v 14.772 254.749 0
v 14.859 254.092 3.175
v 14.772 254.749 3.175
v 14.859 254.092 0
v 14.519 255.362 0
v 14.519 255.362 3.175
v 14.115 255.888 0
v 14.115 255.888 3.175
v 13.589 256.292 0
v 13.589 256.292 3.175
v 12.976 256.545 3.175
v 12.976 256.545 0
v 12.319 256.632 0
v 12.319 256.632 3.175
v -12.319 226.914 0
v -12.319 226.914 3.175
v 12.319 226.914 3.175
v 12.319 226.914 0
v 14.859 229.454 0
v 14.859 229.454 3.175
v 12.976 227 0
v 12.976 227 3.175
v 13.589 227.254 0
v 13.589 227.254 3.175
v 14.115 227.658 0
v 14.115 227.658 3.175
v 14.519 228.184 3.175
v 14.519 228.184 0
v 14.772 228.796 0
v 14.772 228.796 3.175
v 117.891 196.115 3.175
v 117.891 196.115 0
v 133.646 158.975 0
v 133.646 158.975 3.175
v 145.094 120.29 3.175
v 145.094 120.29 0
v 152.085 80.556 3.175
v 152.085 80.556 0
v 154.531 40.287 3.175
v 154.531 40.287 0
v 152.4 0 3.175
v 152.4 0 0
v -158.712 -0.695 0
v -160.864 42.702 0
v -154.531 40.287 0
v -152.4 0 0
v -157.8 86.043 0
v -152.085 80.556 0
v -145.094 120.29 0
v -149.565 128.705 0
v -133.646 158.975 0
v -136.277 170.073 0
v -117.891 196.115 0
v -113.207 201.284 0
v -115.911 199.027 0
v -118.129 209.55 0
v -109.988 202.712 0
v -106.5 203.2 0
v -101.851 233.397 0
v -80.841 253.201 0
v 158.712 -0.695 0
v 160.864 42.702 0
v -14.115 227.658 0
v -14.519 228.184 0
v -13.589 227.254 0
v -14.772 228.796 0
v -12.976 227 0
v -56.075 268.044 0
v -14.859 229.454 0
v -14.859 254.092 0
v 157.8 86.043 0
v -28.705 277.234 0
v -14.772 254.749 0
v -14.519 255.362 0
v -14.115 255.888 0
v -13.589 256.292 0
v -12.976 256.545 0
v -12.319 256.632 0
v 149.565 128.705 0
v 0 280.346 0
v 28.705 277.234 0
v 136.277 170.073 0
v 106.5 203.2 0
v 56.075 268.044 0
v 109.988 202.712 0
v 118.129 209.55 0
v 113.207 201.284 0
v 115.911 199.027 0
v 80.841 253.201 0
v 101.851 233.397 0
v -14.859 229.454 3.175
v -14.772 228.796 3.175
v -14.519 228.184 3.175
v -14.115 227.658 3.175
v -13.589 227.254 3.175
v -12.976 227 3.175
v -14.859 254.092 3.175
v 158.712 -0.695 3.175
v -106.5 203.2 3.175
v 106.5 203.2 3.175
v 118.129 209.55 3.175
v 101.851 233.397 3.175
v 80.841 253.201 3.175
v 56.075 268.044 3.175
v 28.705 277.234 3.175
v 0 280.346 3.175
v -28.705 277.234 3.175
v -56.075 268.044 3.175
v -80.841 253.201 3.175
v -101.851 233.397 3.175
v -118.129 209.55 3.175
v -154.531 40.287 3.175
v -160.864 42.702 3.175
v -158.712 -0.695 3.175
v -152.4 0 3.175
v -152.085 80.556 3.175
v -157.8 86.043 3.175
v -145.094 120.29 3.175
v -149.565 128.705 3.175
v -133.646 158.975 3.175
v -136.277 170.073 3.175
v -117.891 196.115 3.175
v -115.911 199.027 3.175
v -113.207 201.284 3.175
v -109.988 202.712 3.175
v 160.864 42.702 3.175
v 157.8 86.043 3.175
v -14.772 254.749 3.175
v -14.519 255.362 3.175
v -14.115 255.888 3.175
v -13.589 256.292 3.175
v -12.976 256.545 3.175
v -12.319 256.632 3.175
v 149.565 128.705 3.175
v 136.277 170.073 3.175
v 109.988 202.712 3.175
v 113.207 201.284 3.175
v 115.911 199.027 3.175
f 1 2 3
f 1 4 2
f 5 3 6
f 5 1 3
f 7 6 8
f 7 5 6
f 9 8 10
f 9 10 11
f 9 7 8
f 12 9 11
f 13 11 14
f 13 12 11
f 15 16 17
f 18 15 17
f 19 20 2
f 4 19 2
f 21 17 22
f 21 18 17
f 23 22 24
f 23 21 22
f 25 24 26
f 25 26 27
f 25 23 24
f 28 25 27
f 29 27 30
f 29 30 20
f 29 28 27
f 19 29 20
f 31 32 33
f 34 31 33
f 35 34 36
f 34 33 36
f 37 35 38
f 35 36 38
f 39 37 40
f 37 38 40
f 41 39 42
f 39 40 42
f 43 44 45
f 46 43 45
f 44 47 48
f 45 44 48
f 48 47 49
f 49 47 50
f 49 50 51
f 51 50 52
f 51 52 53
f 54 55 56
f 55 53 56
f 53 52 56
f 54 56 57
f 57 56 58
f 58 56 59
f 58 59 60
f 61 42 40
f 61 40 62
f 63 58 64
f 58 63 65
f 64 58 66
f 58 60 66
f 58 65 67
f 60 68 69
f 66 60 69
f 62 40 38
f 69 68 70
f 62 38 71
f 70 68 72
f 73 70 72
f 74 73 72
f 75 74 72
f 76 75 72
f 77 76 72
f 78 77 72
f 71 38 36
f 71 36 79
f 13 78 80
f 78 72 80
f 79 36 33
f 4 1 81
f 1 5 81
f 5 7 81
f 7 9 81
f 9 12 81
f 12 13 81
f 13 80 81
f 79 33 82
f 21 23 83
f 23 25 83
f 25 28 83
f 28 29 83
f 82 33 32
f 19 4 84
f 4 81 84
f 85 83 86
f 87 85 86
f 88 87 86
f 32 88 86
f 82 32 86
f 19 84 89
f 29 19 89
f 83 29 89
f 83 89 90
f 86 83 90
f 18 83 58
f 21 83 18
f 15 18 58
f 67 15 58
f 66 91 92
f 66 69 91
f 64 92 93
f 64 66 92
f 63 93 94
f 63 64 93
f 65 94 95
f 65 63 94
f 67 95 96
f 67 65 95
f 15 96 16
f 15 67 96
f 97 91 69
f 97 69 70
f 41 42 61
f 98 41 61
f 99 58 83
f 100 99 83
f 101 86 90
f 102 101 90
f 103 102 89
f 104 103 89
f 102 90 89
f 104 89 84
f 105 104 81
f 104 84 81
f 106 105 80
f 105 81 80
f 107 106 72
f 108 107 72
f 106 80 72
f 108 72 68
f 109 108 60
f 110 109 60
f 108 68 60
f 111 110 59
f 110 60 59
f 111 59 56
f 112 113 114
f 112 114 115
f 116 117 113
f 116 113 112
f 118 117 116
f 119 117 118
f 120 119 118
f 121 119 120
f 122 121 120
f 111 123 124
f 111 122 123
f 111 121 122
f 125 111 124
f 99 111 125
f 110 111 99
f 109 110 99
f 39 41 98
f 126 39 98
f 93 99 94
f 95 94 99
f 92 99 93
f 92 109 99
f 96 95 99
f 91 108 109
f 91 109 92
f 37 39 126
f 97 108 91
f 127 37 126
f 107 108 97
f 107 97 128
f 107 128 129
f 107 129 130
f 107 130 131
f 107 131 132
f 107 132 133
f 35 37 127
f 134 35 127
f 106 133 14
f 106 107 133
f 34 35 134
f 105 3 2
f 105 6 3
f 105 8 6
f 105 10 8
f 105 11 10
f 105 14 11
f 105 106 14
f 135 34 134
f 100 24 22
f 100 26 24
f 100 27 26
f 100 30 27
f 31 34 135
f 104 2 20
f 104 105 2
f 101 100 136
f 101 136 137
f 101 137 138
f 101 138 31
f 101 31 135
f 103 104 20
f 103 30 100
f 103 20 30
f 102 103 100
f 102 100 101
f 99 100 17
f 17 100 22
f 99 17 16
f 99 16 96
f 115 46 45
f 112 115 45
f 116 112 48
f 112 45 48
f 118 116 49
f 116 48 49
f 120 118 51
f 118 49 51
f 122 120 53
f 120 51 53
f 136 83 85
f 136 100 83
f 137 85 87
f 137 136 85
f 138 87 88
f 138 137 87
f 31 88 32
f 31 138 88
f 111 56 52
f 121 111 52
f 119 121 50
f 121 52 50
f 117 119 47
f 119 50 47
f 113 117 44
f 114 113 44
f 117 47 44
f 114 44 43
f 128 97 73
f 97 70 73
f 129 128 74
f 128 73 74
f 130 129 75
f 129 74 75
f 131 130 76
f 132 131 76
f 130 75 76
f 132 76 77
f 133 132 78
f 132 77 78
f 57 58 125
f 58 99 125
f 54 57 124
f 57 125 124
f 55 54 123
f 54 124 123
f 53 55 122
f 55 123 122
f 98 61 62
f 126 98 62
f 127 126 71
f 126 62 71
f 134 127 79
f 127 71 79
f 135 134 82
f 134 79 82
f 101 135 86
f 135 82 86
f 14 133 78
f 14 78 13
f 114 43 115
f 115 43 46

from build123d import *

# Parameters (mm, degrees)
BOSS_EXTRUDE1_DEPTH = 3.175
CUT_EXTRUDE1_REACH  = 325.245
SKETCH2_W           = 29.718
SKETCH2_H           = 29.718
FILLET1_R           = 2.54
FILLET2_R           = 12.7


with BuildPart() as part:
    # Sketch1 → Boss-Extrude1 (new body)
    with BuildSketch(Plane.XY):
        with BuildLine():
            ThreePointArc((118.128585461, 209.55), (0, 280.345753402), (-118.128585461, 209.55))
            ThreePointArc((-118.128585461, 209.55), (-154.323359707, 107.497469491), (-158.711897248, -0.694588462))
            Line((-158.711897248, -0.694588462), (-152.4, 0))
            ThreePointArc((-152.4, 0), (-148.443103792, 104.429956961), (-114.3, 203.2))
            Line((-114.3, 203.2), (114.3, 203.2))
            ThreePointArc((114.3, 203.2), (148.443103792, 104.429956961), (152.4, 0))
            Line((152.4, 0), (158.711897248, -0.694588462))
            ThreePointArc((158.711897248, -0.694588462), (154.323359707, 107.497469491), (118.128585461, 209.55))
        make_face()
    extrude(amount=BOSS_EXTRUDE1_DEPTH)

    # Sketch2 → Cut-Extrude1 (cut, up to next)
    with BuildSketch(Plane.XY.offset(3.175), mode=Mode.PRIVATE) as cut_extrude1_sk1:
        with Locations((0, 241.772876701)):
            Rectangle(SKETCH2_W, SKETCH2_H)
    cut_extrude1_tool1 = extrude(cut_extrude1_sk1.sketch, amount=-CUT_EXTRUDE1_REACH, mode=Mode.PRIVATE) & part.part
    add(cut_extrude1_tool1.solids().sort_by_distance((0, 241.772877, 3.175))[0], mode=Mode.SUBTRACT)

    # Fillet1
    fillet1_edges = [part.edges().sort_by_distance(p)[0] for p in [
        (14.859, 226.913876701, 1.5875),
        (14.859, 256.631876701, 1.5875),
        (-14.859, 256.631876701, 1.5875),
        (-14.859, 226.913876701, 1.5875),
    ]]
    fillet(fillet1_edges, radius=FILLET1_R)

    # Fillet2
    fillet2_edges = [part.edges().sort_by_distance(p)[0] for p in [
        (114.3, 203.2, 1.5875),
        (-114.3, 203.2, 1.5875),
    ]]
    fillet(fillet2_edges, radius=FILLET2_R)


solid = part.part
